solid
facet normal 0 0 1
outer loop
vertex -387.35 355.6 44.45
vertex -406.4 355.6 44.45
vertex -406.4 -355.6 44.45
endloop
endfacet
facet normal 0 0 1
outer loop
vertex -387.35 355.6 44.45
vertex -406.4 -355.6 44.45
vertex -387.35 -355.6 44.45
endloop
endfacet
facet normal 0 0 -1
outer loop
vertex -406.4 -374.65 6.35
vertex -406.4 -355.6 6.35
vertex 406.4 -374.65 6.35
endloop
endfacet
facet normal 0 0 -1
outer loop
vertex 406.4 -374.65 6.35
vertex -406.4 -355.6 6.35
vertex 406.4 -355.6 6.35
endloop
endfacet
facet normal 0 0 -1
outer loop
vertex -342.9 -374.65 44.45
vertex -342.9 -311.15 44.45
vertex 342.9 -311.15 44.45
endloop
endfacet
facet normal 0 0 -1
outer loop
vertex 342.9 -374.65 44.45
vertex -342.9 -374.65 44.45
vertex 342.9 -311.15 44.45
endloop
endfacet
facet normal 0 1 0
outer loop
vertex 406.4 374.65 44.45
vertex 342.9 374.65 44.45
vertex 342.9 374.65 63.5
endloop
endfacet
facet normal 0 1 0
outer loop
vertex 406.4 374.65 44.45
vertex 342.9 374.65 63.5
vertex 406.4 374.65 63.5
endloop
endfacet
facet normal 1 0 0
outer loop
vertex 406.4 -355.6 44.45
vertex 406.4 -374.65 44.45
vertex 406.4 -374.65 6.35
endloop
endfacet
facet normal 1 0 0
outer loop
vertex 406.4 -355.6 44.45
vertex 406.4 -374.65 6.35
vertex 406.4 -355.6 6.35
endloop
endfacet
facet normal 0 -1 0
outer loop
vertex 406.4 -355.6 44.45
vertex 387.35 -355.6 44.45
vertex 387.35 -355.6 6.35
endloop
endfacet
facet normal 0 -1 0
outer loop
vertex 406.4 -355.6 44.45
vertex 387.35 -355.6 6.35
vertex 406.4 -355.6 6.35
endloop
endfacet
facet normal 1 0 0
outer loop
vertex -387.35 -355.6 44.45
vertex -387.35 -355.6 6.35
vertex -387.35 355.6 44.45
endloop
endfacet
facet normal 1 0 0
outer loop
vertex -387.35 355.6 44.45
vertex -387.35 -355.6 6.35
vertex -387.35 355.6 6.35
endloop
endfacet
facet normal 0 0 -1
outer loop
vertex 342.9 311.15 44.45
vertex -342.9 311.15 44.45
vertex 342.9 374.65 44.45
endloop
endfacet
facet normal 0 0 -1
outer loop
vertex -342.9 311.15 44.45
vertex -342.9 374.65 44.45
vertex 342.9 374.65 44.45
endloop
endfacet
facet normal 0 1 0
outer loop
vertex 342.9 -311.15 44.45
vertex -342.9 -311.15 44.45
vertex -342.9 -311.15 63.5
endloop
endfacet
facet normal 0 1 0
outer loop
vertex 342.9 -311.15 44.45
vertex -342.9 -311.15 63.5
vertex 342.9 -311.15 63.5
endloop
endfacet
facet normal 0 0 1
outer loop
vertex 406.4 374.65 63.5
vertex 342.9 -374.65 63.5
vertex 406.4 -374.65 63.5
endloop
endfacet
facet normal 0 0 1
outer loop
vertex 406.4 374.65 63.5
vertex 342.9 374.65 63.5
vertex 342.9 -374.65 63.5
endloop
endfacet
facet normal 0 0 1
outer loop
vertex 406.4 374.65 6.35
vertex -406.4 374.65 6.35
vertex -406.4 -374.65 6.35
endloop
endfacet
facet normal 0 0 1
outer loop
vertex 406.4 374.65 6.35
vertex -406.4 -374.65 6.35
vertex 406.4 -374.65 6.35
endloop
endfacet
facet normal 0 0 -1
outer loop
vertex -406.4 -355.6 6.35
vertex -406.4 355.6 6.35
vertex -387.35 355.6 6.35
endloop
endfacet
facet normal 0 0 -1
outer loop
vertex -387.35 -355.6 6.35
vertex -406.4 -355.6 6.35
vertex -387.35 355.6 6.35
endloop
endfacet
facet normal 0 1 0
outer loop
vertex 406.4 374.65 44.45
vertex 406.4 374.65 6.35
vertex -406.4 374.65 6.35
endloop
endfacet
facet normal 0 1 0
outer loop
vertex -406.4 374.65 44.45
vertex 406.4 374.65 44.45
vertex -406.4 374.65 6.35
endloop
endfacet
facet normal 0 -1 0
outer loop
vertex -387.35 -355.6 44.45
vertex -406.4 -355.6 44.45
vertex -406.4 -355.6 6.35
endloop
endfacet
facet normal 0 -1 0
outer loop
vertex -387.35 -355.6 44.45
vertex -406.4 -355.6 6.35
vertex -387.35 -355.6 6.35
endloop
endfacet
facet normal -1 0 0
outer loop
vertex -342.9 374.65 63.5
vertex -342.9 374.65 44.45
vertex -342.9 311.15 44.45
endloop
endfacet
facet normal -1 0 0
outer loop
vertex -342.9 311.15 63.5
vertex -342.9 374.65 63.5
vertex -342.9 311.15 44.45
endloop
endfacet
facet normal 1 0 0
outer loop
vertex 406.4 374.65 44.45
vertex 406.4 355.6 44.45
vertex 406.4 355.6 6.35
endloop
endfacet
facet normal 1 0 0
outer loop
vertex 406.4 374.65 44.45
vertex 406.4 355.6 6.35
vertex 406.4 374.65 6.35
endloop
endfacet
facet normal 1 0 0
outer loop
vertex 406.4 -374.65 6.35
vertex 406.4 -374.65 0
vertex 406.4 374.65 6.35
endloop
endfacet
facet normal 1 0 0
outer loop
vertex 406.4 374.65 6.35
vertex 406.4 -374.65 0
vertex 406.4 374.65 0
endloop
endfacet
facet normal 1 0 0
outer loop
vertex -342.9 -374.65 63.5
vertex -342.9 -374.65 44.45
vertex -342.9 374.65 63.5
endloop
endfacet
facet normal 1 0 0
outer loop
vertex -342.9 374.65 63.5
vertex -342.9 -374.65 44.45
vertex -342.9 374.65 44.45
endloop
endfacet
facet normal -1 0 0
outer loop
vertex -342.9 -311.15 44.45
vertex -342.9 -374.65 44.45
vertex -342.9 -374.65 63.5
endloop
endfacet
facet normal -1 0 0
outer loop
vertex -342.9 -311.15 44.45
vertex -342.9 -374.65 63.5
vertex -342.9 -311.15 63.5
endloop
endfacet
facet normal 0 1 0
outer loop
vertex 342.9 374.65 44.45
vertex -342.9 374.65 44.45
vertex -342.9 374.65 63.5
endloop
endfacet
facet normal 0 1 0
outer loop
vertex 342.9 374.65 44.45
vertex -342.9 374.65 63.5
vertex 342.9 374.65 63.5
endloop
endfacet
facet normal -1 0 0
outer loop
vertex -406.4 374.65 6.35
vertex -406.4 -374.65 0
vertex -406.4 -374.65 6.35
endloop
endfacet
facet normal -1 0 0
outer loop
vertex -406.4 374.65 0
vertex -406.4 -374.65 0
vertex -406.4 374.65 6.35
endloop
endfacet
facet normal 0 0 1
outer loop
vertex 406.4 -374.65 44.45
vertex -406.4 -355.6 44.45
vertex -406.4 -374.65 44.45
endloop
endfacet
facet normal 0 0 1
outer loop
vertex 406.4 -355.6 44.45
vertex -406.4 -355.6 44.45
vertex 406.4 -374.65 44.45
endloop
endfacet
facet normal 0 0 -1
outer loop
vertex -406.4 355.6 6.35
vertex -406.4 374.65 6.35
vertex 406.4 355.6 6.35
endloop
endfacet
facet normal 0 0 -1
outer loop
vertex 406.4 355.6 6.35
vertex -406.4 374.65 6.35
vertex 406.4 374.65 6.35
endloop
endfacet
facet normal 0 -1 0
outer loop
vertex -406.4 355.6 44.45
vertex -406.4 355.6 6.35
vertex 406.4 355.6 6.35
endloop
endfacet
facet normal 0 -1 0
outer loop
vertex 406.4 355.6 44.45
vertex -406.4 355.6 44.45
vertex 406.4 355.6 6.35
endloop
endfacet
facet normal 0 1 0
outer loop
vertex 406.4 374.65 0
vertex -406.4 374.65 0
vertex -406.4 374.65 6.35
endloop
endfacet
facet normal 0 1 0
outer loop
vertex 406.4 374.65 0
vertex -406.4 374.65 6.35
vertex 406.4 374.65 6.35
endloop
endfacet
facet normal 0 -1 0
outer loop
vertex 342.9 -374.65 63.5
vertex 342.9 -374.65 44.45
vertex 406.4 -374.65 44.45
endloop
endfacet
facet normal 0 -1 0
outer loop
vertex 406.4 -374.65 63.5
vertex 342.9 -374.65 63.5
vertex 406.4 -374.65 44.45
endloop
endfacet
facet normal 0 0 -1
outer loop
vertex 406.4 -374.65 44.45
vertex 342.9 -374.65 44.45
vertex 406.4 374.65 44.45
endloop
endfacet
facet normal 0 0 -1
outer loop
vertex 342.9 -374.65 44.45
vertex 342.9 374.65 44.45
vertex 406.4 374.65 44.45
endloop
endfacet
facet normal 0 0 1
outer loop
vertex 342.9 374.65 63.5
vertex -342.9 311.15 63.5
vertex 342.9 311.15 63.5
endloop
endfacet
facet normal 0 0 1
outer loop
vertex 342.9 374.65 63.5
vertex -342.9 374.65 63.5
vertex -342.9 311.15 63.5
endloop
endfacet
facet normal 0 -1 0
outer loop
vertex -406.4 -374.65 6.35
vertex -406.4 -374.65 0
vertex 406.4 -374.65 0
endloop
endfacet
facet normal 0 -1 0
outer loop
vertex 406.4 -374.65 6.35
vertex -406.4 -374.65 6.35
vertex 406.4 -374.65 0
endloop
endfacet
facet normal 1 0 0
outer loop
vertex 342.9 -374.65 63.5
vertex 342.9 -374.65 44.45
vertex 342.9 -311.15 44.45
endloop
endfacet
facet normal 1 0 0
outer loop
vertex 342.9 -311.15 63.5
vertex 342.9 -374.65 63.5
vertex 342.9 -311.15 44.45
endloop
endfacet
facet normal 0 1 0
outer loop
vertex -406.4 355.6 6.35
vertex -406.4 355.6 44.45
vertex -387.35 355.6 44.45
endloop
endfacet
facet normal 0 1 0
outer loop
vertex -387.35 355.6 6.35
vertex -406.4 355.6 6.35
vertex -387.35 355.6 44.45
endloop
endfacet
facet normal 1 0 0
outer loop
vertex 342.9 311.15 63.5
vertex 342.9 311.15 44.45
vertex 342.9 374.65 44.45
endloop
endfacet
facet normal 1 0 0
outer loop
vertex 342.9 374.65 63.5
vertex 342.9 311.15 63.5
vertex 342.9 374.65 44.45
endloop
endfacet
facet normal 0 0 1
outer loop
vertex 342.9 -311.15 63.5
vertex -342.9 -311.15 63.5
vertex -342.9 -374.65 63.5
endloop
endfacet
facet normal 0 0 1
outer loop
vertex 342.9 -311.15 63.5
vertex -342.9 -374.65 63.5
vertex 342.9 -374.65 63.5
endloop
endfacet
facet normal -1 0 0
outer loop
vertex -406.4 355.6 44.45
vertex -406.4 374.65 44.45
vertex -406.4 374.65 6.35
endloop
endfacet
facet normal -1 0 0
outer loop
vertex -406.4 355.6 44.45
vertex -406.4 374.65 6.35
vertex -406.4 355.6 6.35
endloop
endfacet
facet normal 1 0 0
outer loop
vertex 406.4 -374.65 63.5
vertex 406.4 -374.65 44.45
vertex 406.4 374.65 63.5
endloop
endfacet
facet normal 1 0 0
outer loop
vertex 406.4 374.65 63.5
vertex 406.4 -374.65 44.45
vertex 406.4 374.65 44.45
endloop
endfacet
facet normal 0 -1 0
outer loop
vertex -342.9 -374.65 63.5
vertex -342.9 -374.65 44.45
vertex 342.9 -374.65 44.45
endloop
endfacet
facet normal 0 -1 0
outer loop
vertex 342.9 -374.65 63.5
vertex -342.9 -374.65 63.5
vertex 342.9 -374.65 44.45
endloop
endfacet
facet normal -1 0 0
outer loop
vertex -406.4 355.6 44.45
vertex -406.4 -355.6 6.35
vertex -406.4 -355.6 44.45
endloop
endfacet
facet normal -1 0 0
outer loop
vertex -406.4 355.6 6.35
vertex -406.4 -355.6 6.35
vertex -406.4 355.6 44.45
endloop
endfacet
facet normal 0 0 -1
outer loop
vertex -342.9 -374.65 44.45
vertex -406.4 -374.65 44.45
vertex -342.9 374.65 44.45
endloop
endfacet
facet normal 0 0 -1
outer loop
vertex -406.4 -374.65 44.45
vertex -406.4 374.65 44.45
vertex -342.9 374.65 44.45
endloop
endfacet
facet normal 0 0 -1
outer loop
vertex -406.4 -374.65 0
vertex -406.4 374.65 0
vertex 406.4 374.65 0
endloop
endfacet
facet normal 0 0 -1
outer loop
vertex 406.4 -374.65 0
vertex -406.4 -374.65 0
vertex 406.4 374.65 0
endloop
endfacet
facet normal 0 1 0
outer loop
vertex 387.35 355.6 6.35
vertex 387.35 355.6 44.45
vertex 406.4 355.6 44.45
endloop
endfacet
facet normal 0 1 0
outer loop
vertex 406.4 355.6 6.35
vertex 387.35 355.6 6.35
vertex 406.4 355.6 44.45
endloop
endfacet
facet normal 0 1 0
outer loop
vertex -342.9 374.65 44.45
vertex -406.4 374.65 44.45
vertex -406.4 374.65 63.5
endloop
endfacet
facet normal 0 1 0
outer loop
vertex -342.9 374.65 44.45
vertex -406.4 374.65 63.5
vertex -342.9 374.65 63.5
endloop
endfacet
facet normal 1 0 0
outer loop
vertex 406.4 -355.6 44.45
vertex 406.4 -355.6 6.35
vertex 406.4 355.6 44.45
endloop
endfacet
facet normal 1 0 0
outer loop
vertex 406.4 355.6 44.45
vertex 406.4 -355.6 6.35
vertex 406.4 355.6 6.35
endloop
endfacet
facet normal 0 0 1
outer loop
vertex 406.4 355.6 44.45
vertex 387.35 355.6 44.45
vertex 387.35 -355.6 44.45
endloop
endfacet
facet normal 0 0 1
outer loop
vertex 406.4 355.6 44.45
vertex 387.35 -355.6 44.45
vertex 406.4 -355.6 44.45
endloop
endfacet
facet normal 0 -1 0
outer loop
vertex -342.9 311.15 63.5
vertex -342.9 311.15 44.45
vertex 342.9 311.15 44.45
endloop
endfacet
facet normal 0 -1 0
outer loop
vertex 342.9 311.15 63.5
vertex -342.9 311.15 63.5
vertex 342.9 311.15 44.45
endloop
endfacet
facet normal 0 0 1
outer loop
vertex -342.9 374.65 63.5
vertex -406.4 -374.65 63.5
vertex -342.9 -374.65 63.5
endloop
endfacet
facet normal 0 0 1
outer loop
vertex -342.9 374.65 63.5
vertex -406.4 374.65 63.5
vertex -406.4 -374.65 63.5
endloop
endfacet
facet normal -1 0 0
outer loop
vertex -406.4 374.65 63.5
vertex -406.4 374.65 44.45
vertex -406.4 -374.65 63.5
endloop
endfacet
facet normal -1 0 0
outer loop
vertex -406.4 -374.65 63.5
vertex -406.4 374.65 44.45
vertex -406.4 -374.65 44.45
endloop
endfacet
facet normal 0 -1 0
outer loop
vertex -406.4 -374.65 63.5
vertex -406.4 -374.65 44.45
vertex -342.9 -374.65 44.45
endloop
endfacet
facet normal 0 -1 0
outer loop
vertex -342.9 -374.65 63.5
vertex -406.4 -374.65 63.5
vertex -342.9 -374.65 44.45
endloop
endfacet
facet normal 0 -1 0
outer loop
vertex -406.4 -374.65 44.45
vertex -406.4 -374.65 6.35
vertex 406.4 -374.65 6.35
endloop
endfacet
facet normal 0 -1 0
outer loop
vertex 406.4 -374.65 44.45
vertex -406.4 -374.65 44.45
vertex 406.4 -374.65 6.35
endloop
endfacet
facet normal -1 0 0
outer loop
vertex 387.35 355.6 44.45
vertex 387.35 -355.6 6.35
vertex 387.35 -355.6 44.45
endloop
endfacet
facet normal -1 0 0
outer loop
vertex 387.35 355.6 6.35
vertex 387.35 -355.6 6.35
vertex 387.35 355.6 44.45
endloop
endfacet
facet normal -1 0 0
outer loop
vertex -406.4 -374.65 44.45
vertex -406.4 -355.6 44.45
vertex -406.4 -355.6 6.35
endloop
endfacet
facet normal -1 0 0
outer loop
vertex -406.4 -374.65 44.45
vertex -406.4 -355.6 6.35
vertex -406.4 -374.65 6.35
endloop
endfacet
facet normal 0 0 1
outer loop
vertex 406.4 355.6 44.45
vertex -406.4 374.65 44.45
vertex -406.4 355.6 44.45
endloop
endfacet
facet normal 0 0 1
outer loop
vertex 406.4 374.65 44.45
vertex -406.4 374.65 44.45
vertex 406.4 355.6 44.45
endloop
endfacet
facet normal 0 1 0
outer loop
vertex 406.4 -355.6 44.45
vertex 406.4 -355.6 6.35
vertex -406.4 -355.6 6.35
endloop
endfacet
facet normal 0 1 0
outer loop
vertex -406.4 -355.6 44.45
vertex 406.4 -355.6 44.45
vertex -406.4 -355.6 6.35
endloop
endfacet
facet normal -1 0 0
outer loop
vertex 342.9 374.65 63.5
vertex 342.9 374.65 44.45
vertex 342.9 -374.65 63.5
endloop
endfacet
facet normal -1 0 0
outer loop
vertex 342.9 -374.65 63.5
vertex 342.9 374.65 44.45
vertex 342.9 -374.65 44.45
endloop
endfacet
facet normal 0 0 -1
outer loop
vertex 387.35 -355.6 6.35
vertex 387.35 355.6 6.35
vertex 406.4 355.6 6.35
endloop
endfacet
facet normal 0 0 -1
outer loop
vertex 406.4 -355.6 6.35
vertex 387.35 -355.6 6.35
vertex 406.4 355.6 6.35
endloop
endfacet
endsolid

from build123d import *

# Parameters (mm, degrees)
SKETCH1_W             = 812.8
SKETCH1_H             = 749.3
BOSS_EXTRUDE1_DEPTH   = 6.35
SKETCH2_W             = 812.8
SKETCH2_H             = 19.05
BOSS_EXTRUDE2_DEPTH   = 38.1
BOSS_EXTRUDE2_2_DEPTH = 38.1
SKETCH2_3_W           = 19.05
SKETCH2_3_H           = 711.2
BOSS_EXTRUDE3_DEPTH   = 38.1
BOSS_EXTRUDE3_2_DEPTH = 38.1
SKETCH3_W             = 63.5
SKETCH3_H             = 749.3
BOSS_EXTRUDE4_DEPTH   = 19.05
BOSS_EXTRUDE4_2_DEPTH = 19.05
SKETCH3_3_W           = 685.8
SKETCH3_3_H           = 63.5
BOSS_EXTRUDE5_DEPTH   = 19.05
BOSS_EXTRUDE5_2_DEPTH = 19.05


with BuildPart() as part:
    # Sketch1 → Boss-Extrude1 (new body)
    with BuildSketch(Plane.XY):
        Rectangle(SKETCH1_W, SKETCH1_H)
    extrude(amount=BOSS_EXTRUDE1_DEPTH)


with BuildPart() as body_2:
    # Sketch2 → Boss-Extrude2 (new body)
    with BuildSketch(Plane.XY.offset(6.35)):
        with Locations((0, 365.125)):
            Rectangle(SKETCH2_W, SKETCH2_H)
    extrude(amount=BOSS_EXTRUDE2_DEPTH)


with BuildPart() as body_3:
    # Sketch2 → Boss-Extrude2 2 (new body)
    with BuildSketch(Plane.XY.offset(6.35)):
        with Locations((0, -365.125)):
            Rectangle(SKETCH2_W, SKETCH2_H)
    extrude(amount=BOSS_EXTRUDE2_2_DEPTH)


with BuildPart() as body_4:
    # Sketch2<3> → Boss-Extrude3 (new body)
    with BuildSketch(Plane.XY.offset(6.35)):
        with Locations((-396.875, 0)):
            Rectangle(SKETCH2_3_W, SKETCH2_3_H)
    extrude(amount=BOSS_EXTRUDE3_DEPTH)


with BuildPart() as body_5:
    # Sketch2<3> → Boss-Extrude3 2 (new body)
    with BuildSketch(Plane.XY.offset(6.35)):
        with Locations((396.875, 0)):
            Rectangle(SKETCH2_3_W, SKETCH2_3_H)
    extrude(amount=BOSS_EXTRUDE3_2_DEPTH)


with BuildPart() as body_6:
    # Sketch3 → Boss-Extrude4 (new body)
    with BuildSketch(Plane.XY.offset(44.45)):
        with Locations((-374.65, 0)):
            Rectangle(SKETCH3_W, SKETCH3_H)
    extrude(amount=BOSS_EXTRUDE4_DEPTH)


with BuildPart() as body_7:
    # Sketch3 → Boss-Extrude4 2 (new body)
    with BuildSketch(Plane.XY.offset(44.45)):
        with Locations((374.65, 0)):
            Rectangle(SKETCH3_W, SKETCH3_H)
    extrude(amount=BOSS_EXTRUDE4_2_DEPTH)


with BuildPart() as body_8:
    # Sketch3<3> → Boss-Extrude5 (new body)
    with BuildSketch(Plane.XY.offset(44.45)):
        with Locations((0, 342.9)):
            Rectangle(SKETCH3_3_W, SKETCH3_3_H)
    extrude(amount=BOSS_EXTRUDE5_DEPTH)


with BuildPart() as body_9:
    # Sketch3<3> → Boss-Extrude5 2 (new body)
    with BuildSketch(Plane.XY.offset(44.45)):
        with Locations((0, -342.9)):
            Rectangle(SKETCH3_3_W, SKETCH3_3_H)
    extrude(amount=BOSS_EXTRUDE5_2_DEPTH)


solid = Compound([part.part, body_2.part, body_3.part, body_4.part, body_5.part, body_6.part, body_7.part, body_8.part, body_9.part])
